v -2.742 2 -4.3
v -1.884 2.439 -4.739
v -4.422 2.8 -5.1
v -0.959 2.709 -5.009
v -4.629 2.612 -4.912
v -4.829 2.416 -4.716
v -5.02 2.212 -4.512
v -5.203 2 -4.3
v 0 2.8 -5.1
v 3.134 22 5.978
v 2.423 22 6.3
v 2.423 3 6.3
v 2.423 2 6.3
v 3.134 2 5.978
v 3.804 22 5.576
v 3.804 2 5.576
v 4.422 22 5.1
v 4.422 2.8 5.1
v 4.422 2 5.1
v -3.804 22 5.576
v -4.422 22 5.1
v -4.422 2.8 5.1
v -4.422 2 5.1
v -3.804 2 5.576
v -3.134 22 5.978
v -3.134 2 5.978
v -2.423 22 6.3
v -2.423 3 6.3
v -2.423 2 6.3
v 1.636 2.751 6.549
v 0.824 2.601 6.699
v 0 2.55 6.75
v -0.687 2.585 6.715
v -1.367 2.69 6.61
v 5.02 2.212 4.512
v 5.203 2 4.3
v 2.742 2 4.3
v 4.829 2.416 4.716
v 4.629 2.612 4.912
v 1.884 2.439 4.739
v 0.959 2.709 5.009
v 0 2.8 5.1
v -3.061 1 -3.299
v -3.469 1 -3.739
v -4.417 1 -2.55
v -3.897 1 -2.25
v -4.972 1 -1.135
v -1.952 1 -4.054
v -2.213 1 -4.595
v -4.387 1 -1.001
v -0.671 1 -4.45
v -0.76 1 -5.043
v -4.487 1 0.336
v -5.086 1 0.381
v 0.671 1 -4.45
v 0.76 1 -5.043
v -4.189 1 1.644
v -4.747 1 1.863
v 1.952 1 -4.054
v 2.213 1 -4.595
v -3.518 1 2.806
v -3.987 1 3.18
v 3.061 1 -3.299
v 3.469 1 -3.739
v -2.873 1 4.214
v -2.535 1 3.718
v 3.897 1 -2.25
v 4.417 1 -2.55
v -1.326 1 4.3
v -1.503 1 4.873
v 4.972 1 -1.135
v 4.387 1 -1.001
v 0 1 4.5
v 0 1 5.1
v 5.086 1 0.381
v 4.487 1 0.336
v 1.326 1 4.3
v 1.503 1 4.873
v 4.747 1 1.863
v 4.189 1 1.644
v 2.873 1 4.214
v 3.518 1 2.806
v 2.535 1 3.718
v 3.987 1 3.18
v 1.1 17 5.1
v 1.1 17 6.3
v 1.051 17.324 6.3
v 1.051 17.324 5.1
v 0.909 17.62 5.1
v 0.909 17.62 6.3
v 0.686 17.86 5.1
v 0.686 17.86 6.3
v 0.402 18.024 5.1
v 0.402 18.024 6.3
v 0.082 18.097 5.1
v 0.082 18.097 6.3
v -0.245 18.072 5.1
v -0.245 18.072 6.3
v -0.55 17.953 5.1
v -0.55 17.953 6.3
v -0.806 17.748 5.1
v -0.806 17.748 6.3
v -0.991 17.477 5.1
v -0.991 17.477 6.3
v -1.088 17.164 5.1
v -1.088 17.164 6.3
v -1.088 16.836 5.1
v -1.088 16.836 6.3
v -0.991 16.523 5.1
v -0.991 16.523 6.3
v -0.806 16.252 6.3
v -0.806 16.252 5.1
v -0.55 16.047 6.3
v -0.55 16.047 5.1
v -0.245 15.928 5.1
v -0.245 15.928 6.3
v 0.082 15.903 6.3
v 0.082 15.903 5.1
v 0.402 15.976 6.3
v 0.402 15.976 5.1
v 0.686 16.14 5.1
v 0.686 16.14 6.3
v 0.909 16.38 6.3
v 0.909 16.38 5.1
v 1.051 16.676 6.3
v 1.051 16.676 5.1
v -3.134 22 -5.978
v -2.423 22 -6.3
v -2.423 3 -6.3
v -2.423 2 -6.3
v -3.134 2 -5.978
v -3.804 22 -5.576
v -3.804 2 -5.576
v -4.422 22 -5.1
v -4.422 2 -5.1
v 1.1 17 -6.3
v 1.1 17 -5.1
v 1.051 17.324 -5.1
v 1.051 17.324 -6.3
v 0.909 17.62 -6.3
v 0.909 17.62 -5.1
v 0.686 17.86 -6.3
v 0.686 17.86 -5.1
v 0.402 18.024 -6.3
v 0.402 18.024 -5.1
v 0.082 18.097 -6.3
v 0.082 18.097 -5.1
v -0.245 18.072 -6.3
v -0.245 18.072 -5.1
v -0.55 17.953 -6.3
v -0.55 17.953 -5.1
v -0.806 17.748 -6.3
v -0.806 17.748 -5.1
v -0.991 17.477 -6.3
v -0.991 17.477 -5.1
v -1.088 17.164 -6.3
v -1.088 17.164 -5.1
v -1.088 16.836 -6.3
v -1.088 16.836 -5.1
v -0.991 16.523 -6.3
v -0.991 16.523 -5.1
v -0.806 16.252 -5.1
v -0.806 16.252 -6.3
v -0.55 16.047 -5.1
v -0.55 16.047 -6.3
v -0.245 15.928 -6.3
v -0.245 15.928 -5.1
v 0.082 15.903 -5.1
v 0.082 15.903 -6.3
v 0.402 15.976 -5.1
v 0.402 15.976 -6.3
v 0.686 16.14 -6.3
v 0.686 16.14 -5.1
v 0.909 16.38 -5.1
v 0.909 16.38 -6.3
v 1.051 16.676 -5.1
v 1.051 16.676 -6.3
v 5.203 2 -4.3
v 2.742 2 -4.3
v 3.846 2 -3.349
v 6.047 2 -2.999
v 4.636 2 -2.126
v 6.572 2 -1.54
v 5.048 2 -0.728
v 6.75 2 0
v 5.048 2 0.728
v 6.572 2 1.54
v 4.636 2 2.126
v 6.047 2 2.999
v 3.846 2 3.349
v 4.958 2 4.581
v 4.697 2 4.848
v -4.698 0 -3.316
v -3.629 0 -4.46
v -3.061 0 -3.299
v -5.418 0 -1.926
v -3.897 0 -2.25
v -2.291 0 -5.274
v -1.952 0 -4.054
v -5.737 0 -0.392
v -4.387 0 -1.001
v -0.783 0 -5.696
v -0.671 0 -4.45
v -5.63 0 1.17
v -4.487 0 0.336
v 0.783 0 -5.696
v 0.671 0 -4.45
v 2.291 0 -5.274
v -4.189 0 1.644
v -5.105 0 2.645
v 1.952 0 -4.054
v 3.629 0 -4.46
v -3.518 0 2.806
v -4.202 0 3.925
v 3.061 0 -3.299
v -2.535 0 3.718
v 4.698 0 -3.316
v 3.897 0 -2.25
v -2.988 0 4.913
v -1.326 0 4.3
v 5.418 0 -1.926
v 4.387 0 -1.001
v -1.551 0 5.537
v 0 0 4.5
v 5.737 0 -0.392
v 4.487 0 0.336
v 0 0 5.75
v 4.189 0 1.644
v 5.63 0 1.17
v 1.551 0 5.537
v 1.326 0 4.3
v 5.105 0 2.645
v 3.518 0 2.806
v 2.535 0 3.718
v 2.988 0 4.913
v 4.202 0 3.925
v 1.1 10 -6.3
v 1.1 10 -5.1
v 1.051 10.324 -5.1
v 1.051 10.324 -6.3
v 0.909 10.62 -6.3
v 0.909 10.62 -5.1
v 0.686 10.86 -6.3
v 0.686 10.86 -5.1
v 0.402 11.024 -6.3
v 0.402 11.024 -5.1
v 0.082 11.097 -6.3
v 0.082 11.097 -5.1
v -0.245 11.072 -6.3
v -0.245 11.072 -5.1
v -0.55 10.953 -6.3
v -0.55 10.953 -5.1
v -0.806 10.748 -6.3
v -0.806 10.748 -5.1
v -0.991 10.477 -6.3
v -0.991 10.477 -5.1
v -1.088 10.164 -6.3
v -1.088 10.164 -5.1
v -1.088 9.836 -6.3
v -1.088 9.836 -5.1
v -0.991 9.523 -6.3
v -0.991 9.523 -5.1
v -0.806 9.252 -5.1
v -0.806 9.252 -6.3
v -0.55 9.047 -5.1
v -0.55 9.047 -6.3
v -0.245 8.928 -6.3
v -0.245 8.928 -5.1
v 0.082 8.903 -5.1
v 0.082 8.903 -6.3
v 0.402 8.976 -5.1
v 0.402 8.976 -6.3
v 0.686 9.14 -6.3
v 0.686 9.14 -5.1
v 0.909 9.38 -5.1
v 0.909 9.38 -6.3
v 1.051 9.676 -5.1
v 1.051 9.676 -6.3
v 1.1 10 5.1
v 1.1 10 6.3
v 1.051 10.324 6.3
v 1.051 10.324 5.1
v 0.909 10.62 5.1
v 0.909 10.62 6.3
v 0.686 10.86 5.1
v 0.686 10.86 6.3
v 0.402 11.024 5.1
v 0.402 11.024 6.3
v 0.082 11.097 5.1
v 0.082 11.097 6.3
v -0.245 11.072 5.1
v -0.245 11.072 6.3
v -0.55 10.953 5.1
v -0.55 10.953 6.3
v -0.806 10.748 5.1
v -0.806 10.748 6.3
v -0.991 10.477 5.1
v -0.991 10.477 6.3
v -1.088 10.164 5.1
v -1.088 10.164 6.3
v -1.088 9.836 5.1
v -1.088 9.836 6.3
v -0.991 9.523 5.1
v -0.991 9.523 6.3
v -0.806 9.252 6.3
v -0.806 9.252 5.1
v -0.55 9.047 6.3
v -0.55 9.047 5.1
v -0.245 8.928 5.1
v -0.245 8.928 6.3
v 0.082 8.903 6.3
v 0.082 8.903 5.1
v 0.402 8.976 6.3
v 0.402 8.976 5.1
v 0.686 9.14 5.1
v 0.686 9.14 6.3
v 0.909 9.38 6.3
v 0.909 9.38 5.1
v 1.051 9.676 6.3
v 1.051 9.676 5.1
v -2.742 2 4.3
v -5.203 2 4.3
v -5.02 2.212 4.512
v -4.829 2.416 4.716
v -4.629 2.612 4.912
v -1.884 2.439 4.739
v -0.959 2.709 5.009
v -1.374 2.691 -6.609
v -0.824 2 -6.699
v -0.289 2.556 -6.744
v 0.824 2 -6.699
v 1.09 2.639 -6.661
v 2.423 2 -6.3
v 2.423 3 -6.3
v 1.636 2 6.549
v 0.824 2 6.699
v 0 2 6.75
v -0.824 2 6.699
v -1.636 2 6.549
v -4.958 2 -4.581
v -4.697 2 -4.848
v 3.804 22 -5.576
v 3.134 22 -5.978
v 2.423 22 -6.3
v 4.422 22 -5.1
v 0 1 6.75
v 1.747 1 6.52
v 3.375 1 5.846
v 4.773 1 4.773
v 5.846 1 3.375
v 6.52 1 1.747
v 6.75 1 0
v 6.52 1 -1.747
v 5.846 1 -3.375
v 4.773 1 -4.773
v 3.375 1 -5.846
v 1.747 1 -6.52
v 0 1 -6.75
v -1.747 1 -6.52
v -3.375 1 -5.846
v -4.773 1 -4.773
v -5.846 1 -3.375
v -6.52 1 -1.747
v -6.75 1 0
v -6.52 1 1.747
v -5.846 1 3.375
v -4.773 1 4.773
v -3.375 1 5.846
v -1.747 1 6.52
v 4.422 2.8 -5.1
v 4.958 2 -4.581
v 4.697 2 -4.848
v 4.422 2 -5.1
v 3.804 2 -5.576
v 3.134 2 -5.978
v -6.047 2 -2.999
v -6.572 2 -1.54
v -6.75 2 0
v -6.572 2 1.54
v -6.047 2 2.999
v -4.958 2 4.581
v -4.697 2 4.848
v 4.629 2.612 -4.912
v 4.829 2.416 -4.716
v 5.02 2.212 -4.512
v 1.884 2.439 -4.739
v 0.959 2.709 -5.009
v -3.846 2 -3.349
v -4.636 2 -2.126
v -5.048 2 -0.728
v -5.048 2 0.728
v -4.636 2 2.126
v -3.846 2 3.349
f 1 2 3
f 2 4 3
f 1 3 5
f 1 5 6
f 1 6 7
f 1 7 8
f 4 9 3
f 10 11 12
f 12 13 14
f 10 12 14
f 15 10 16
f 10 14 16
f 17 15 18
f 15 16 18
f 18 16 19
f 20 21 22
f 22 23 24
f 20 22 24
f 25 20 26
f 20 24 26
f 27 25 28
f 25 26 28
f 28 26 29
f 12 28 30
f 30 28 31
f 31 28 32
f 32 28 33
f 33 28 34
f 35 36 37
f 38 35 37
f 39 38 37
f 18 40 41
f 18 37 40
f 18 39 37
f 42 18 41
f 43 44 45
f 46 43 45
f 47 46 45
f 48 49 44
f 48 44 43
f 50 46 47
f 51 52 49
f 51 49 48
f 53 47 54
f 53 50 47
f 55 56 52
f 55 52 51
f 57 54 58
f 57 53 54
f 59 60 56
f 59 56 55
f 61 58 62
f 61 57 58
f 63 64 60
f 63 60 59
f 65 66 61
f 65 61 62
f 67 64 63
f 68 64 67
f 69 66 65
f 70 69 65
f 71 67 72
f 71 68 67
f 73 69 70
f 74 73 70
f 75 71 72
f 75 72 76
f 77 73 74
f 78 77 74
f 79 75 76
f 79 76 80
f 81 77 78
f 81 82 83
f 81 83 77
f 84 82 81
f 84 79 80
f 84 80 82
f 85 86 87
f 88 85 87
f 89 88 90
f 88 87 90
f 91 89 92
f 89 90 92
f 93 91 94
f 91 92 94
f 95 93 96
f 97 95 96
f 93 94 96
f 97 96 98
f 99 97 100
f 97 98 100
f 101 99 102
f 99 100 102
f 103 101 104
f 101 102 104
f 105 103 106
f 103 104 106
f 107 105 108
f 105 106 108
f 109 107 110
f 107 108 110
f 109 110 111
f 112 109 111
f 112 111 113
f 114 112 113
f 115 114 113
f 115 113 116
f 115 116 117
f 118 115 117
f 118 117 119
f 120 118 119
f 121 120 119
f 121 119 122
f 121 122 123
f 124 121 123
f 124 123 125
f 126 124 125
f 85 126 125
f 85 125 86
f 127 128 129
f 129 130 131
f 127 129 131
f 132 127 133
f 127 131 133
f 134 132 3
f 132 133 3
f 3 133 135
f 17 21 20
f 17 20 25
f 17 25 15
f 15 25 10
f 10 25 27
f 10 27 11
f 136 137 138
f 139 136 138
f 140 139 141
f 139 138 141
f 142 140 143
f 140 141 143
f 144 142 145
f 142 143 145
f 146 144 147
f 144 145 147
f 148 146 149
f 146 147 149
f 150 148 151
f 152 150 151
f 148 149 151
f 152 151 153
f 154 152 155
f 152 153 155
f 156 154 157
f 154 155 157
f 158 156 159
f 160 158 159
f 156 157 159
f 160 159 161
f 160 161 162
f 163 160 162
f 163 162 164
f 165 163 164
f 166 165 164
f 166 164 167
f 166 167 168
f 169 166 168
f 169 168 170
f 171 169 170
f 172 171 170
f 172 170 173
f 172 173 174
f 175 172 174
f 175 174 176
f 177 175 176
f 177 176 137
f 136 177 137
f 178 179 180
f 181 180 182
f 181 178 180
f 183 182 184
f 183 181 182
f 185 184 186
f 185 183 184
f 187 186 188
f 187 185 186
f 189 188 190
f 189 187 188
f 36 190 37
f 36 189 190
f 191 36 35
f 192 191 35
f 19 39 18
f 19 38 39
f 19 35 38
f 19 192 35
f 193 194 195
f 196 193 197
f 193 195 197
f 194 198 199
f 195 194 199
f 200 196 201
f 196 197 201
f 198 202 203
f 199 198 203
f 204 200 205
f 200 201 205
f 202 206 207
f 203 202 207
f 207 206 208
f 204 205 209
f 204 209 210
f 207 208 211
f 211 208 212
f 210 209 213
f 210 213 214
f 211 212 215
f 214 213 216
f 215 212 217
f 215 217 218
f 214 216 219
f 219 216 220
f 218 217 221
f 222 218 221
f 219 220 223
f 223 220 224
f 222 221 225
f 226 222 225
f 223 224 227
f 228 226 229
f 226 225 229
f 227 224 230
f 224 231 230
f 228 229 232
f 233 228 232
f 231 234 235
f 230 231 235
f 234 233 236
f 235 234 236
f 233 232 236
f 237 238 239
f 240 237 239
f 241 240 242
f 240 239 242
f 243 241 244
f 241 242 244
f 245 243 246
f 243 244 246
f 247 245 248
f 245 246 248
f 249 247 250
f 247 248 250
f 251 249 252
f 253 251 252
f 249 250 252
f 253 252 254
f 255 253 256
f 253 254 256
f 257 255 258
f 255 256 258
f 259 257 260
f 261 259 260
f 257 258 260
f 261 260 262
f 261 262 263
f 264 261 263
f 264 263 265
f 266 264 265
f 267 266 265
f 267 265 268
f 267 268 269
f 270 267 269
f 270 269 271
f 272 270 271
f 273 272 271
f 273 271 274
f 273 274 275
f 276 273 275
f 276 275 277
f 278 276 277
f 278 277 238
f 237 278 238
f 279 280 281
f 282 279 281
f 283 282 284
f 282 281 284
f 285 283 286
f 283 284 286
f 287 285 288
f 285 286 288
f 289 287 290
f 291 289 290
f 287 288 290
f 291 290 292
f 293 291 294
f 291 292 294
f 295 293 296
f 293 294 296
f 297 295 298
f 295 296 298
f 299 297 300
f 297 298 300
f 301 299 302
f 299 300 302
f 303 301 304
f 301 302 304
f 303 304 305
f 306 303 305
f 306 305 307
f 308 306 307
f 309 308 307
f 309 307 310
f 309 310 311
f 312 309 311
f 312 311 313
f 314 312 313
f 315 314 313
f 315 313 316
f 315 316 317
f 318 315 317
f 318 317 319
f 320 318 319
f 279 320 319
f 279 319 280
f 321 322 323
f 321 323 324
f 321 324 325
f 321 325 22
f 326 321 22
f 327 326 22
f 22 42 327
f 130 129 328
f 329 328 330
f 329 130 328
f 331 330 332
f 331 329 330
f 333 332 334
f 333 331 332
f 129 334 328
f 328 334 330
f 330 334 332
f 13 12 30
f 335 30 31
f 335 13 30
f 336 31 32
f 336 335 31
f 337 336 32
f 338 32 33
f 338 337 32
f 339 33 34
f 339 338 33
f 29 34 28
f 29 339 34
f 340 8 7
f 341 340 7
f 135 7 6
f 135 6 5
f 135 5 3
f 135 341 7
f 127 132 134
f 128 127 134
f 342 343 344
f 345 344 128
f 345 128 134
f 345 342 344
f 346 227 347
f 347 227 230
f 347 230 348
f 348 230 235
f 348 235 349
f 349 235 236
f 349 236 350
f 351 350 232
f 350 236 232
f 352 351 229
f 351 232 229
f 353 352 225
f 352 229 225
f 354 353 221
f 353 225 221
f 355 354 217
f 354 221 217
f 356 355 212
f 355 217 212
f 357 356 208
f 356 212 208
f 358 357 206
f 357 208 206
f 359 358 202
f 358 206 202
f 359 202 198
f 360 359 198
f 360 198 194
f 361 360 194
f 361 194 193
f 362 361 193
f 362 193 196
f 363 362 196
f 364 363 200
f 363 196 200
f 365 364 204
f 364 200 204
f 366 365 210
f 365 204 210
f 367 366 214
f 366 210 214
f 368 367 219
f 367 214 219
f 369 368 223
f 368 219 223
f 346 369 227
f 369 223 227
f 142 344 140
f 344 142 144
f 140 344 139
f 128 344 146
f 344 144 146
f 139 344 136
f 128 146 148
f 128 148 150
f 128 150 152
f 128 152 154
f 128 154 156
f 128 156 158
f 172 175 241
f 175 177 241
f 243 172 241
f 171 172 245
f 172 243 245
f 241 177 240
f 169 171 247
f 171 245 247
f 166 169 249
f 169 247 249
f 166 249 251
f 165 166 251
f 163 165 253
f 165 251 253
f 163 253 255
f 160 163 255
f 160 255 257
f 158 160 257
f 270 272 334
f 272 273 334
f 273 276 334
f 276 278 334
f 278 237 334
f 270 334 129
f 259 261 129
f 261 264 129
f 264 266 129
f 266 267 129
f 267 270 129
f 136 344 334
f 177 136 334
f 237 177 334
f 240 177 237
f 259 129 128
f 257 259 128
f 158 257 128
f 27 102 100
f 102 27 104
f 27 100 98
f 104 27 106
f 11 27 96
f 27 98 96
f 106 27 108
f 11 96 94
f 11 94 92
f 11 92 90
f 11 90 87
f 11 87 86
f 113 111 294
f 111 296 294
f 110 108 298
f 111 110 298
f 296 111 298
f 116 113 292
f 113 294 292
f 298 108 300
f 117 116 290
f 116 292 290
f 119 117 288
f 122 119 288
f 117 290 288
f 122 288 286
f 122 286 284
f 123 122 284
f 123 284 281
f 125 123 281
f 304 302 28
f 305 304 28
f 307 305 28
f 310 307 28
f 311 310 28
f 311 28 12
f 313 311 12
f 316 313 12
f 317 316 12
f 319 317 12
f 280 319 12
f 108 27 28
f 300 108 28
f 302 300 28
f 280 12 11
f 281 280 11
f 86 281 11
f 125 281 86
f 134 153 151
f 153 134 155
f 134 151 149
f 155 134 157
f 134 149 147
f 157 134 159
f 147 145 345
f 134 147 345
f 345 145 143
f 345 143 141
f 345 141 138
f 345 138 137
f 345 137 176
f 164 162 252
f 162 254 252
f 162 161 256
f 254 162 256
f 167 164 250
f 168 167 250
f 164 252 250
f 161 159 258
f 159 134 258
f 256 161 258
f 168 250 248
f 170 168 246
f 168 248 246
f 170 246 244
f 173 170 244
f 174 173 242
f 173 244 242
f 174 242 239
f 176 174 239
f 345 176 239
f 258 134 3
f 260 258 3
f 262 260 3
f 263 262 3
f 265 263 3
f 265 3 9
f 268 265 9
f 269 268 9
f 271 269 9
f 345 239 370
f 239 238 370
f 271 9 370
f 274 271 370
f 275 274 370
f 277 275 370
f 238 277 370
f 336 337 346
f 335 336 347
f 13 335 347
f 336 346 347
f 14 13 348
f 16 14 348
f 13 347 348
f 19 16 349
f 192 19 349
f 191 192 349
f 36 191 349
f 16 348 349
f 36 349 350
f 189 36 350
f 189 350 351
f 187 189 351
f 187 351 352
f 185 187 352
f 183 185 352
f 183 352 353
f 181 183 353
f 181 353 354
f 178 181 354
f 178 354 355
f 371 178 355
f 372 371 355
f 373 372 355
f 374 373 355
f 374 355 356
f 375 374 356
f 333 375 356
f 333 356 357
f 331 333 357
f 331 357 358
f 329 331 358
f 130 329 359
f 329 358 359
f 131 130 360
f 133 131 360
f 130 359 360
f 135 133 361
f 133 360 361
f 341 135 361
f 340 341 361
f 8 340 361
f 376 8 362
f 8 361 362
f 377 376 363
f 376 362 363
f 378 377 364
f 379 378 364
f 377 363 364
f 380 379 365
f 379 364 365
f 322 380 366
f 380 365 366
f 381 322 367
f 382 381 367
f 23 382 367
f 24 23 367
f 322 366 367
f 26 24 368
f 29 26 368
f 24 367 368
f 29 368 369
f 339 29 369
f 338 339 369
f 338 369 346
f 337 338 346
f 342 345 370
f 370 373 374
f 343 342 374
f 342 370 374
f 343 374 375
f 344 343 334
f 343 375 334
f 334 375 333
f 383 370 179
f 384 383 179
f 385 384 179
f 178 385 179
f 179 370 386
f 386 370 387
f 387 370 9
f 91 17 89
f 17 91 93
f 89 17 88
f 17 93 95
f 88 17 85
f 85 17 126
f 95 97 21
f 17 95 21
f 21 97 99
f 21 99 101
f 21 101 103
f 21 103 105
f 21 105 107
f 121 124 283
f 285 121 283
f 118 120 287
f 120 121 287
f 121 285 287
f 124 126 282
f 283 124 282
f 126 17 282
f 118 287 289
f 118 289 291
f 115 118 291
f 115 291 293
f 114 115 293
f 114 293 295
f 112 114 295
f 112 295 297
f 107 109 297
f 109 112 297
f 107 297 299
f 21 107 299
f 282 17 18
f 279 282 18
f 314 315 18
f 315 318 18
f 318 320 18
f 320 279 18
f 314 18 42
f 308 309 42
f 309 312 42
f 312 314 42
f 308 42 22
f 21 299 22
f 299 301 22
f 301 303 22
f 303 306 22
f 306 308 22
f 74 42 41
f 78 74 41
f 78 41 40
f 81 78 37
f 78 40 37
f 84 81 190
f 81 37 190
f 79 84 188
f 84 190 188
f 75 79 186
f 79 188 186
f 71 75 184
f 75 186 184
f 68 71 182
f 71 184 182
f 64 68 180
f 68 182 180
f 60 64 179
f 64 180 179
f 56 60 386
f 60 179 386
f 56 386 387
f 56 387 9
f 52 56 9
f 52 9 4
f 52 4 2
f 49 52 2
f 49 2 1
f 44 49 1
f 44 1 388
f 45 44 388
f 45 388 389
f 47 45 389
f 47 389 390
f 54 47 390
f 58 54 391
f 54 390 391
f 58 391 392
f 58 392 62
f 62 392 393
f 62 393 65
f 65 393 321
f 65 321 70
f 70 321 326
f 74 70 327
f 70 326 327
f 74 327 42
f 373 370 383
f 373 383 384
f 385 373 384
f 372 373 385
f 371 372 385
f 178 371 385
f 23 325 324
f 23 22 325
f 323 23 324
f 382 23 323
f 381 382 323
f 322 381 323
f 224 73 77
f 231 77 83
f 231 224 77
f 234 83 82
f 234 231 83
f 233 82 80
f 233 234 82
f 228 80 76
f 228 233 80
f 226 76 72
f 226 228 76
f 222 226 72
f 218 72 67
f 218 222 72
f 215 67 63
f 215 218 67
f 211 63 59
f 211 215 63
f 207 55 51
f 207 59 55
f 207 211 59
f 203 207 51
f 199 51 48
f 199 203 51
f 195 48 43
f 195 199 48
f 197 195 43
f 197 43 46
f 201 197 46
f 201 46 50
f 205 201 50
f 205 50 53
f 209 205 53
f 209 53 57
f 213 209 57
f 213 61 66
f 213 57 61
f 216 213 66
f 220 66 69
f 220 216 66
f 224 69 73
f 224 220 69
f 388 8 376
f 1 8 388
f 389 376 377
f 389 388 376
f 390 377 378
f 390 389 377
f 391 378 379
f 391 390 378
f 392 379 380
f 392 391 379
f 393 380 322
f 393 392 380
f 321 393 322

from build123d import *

# Parameters (mm, degrees)
SKETCH_1_R          = 6.75
SKETCH_1_R_2        = 4.5
EXTRUDE_1_DEPTH     = 2
SKETCH_2_R          = 5.1000000000000005
CUT_EXTRUDE_1_DEPTH = 1
EXTRUDE_2_DEPTH     = 20
SKETCH_4_R          = 1.1
CUT_EXTRUDE_2_DEPTH = 20
CHAMFER_1_SIZE      = 1
CHAMFER_2_SIZE      = 1
CHAMFER_3_SIZE      = 0.8


with BuildPart() as part:
    # 草图1 → 凸台-拉伸1 (new body)
    with BuildSketch(Plane(origin=(0, 0, 0), x_dir=(1, 0, 0), z_dir=(0, 1, 0))):
        with Locations(Location((0, 0, 0), (0, 0, 270))):
            Circle(SKETCH_1_R)
        with Locations(Location((0, 0, 0), (0, 0, 270))):
            Circle(SKETCH_1_R_2, mode=Mode.SUBTRACT)
    extrude(amount=EXTRUDE_1_DEPTH)

    # 草图2 → 切除-拉伸1 (cut)
    with BuildSketch(Plane(origin=(0, 2, 0), x_dir=(1, 0, 0), z_dir=(0, 1, 0))):
        with Locations(Location((0, 0, 0), (0, 0, 270))):
            Circle(SKETCH_2_R)
    extrude(amount=-CUT_EXTRUDE_1_DEPTH, mode=Mode.SUBTRACT)

    # 草图3 → 凸台-拉伸2 (add)
    with BuildSketch(Plane(origin=(0, 2, 0), x_dir=(1, 0, 0), z_dir=(0, 1, 0))):
        with BuildLine():
            ThreePointArc((-2.4233241632105296, 6.299999999999999), (-3.4747665686142524, 5.786924683598426), (-4.421820891895102, 5.1))
            Line((-4.421820891895103, 5.1), (4.421820891895103, 5.1))
            ThreePointArc((4.421820891895103, 5.099999999999999), (3.4747665686142533, 5.786924683598425), (2.4233241632105287, 6.299999999999999))
            Line((2.4233241632105287, 6.299999999999999), (-2.4233241632105287, 6.299999999999999))
        make_face()
        with BuildLine():
            Line((4.421820891895103, -5.1), (-4.421820891895103, -5.1))
            ThreePointArc((-4.421820891895104, -5.099999999999999), (-3.4747665686142537, -5.786924683598424), (-2.4233241632105327, -6.299999999999998))
            Line((-2.4233241632105287, -6.299999999999999), (2.4233241632105287, -6.299999999999999))
            ThreePointArc((2.4233241632105305, -6.299999999999999), (3.4747665686142515, -5.786924683598426), (4.4218208918951, -5.100000000000002))
        make_face()
    extrude(amount=EXTRUDE_2_DEPTH)

    # 草图4 → 切除-拉伸2 (cut)
    with BuildSketch(Plane.XY.offset(6.299999999999999)):
        with Locations((0, 17)):
            Circle(SKETCH_4_R)
        with Locations((0, 10)):
            Circle(SKETCH_4_R)
    extrude(amount=-CUT_EXTRUDE_2_DEPTH, mode=Mode.SUBTRACT)

    # 倒角1
    chamfer_1_edges = [part.edges().sort_by_distance(p)[0] for p in [
        (2.07e-15, 0, -6.75),
    ]]
    chamfer(chamfer_1_edges, length=CHAMFER_1_SIZE)

    # 倒角2
    # the kernel refuses this chamfer: 1 mm, written as the material it adds along each edge
    with BuildSketch(Plane(origin=(-4.99500715117644, 2, 6.299999999999999), x_dir=(0, -0.02749587661058627, 0.9996219169112968), z_dir=(1, 0, 0))) as chamfer_2_piece_1_section:
        Polygon((CHAMFER_2_SIZE * 0.999621916911, -CHAMFER_2_SIZE * 0.0274958766106), (-CHAMFER_2_SIZE * 0.0274958766106, -CHAMFER_2_SIZE * 0.999621916911), (0, 0), align=None)
    chamfer_2_piece_1 = extrude(amount=9.99001430235288, mode=Mode.PRIVATE)
    chamfer_2_piece_1 = chamfer_2_piece_1 & Plane(origin=(0, 2.4270240962086875, 0), x_dir=(-1.8e-16, 0, 1), z_dir=(0, -1, 0)) * Cylinder(6.75, 24, mode=Mode.PRIVATE)
    add(chamfer_2_piece_1)
    with BuildSketch(Plane(origin=(4.99500715117644, 2, -6.299999999999999), x_dir=(0, -0.02749587661058627, -0.9996219169112968), z_dir=(-1, 0, 0))) as chamfer_2_piece_2_section:
        Polygon((CHAMFER_2_SIZE * 0.999621916911, -CHAMFER_2_SIZE * 0.0274958766106), (-CHAMFER_2_SIZE * 0.0274958766106, -CHAMFER_2_SIZE * 0.999621916911), (0, 0), align=None)
    chamfer_2_piece_2 = extrude(amount=9.99001430235288, mode=Mode.PRIVATE)
    chamfer_2_piece_2 = chamfer_2_piece_2 & Plane(origin=(0, 2.4270241038722706, 0), x_dir=(-1.8e-16, 0, 1), z_dir=(0, -1, 0)) * Cylinder(6.75, 24, mode=Mode.PRIVATE)
    add(chamfer_2_piece_2)

    # 倒角3
    # the kernel refuses this chamfer: 0.8 mm, written as the material it adds along each edge
    with BuildSketch(Plane(origin=(6.22e-15, 2, -5.1), x_dir=(0, 0.9996219169112968, -0.027495876610586285), z_dir=(1, 0, 0))) as chamfer_3_piece_1_section:
        Polygon((CHAMFER_3_SIZE * 0.999621916911, CHAMFER_3_SIZE * 0.0274958766106), (-CHAMFER_3_SIZE * 0.0274958766106, CHAMFER_3_SIZE * 0.999621916911), (0, 0), align=None)
    chamfer_3_piece_1 = extrude(amount=6.479167282267824, mode=Mode.PRIVATE)
    chamfer_3_piece_1 = chamfer_3_piece_1 & Plane(origin=(0, 2.278466401916116, 0), x_dir=(-1.8e-16, 0, 1), z_dir=(0, -1, 0)) * Cylinder(6.75, 17, mode=Mode.PRIVATE)
    chamfer_3_piece_1 = chamfer_3_piece_1 - Plane(origin=(0, 2.278466401916116, 0), x_dir=(-1.8e-16, 0, 1), z_dir=(0, 1, 0)) * Cylinder(5.1000000000000005, 17, mode=Mode.PRIVATE)
    add(chamfer_3_piece_1)
    with BuildSketch(Plane(origin=(-6.479167282267831, 2, -5.1), x_dir=(0, 0.9996219169112968, -0.027495876610586285), z_dir=(1, 0, 0))) as chamfer_3_piece_2_section:
        Polygon((CHAMFER_3_SIZE * 0.999621916911, CHAMFER_3_SIZE * 0.0274958766106), (-CHAMFER_3_SIZE * 0.0274958766106, CHAMFER_3_SIZE * 0.999621916911), (0, 0), align=None)
    chamfer_3_piece_2 = extrude(amount=6.479167282267837, mode=Mode.PRIVATE)
    chamfer_3_piece_2 = chamfer_3_piece_2 & Plane(origin=(0, 2.27846640235757, 0), x_dir=(-1.8e-16, 0, 1), z_dir=(0, -1, 0)) * Cylinder(6.75, 17, mode=Mode.PRIVATE)
    chamfer_3_piece_2 = chamfer_3_piece_2 - Plane(origin=(0, 2.27846640235757, 0), x_dir=(-1.8e-16, 0, 1), z_dir=(0, 1, 0)) * Cylinder(5.1000000000000005, 17, mode=Mode.PRIVATE)
    add(chamfer_3_piece_2)
    with BuildSketch(Plane(origin=(-8.9e-16, 2, 5.1), x_dir=(0, -0.027495876610586285, -0.9996219169112968), z_dir=(-1, 0, 0))) as chamfer_3_piece_3_section:
        Polygon((CHAMFER_3_SIZE * 0.999621916911, -CHAMFER_3_SIZE * 0.0274958766106), (-CHAMFER_3_SIZE * 0.0274958766106, -CHAMFER_3_SIZE * 0.999621916911), (0, 0), align=None)
    chamfer_3_piece_3 = extrude(amount=6.479167282267829, mode=Mode.PRIVATE)
    chamfer_3_piece_3 = chamfer_3_piece_3 & Plane(origin=(0, 2.2784664022483097, 0), x_dir=(-1.8e-16, 0, 1), z_dir=(0, -1, 0)) * Cylinder(6.75, 17, mode=Mode.PRIVATE)
    chamfer_3_piece_3 = chamfer_3_piece_3 - Plane(origin=(0, 2.2784664022483097, 0), x_dir=(-1.8e-16, 0, 1), z_dir=(0, 1, 0)) * Cylinder(5.1000000000000005, 17, mode=Mode.PRIVATE)
    add(chamfer_3_piece_3)
    with BuildSketch(Plane(origin=(6.479167282267831, 2, 5.1), x_dir=(0, -0.027495876610586285, -0.9996219169112968), z_dir=(-1, 0, 0))) as chamfer_3_piece_4_section:
        Polygon((CHAMFER_3_SIZE * 0.999621916911, -CHAMFER_3_SIZE * 0.0274958766106), (-CHAMFER_3_SIZE * 0.0274958766106, -CHAMFER_3_SIZE * 0.999621916911), (0, 0), align=None)
    chamfer_3_piece_4 = extrude(amount=6.479167282267832, mode=Mode.PRIVATE)
    chamfer_3_piece_4 = chamfer_3_piece_4 & Plane(origin=(0, 2.278466402305348, 0), x_dir=(-1.8e-16, 0, 1), z_dir=(0, -1, 0)) * Cylinder(6.75, 17, mode=Mode.PRIVATE)
    chamfer_3_piece_4 = chamfer_3_piece_4 - Plane(origin=(0, 2.278466402305348, 0), x_dir=(-1.8e-16, 0, 1), z_dir=(0, 1, 0)) * Cylinder(5.1000000000000005, 17, mode=Mode.PRIVATE)
    add(chamfer_3_piece_4)


solid = part.part
